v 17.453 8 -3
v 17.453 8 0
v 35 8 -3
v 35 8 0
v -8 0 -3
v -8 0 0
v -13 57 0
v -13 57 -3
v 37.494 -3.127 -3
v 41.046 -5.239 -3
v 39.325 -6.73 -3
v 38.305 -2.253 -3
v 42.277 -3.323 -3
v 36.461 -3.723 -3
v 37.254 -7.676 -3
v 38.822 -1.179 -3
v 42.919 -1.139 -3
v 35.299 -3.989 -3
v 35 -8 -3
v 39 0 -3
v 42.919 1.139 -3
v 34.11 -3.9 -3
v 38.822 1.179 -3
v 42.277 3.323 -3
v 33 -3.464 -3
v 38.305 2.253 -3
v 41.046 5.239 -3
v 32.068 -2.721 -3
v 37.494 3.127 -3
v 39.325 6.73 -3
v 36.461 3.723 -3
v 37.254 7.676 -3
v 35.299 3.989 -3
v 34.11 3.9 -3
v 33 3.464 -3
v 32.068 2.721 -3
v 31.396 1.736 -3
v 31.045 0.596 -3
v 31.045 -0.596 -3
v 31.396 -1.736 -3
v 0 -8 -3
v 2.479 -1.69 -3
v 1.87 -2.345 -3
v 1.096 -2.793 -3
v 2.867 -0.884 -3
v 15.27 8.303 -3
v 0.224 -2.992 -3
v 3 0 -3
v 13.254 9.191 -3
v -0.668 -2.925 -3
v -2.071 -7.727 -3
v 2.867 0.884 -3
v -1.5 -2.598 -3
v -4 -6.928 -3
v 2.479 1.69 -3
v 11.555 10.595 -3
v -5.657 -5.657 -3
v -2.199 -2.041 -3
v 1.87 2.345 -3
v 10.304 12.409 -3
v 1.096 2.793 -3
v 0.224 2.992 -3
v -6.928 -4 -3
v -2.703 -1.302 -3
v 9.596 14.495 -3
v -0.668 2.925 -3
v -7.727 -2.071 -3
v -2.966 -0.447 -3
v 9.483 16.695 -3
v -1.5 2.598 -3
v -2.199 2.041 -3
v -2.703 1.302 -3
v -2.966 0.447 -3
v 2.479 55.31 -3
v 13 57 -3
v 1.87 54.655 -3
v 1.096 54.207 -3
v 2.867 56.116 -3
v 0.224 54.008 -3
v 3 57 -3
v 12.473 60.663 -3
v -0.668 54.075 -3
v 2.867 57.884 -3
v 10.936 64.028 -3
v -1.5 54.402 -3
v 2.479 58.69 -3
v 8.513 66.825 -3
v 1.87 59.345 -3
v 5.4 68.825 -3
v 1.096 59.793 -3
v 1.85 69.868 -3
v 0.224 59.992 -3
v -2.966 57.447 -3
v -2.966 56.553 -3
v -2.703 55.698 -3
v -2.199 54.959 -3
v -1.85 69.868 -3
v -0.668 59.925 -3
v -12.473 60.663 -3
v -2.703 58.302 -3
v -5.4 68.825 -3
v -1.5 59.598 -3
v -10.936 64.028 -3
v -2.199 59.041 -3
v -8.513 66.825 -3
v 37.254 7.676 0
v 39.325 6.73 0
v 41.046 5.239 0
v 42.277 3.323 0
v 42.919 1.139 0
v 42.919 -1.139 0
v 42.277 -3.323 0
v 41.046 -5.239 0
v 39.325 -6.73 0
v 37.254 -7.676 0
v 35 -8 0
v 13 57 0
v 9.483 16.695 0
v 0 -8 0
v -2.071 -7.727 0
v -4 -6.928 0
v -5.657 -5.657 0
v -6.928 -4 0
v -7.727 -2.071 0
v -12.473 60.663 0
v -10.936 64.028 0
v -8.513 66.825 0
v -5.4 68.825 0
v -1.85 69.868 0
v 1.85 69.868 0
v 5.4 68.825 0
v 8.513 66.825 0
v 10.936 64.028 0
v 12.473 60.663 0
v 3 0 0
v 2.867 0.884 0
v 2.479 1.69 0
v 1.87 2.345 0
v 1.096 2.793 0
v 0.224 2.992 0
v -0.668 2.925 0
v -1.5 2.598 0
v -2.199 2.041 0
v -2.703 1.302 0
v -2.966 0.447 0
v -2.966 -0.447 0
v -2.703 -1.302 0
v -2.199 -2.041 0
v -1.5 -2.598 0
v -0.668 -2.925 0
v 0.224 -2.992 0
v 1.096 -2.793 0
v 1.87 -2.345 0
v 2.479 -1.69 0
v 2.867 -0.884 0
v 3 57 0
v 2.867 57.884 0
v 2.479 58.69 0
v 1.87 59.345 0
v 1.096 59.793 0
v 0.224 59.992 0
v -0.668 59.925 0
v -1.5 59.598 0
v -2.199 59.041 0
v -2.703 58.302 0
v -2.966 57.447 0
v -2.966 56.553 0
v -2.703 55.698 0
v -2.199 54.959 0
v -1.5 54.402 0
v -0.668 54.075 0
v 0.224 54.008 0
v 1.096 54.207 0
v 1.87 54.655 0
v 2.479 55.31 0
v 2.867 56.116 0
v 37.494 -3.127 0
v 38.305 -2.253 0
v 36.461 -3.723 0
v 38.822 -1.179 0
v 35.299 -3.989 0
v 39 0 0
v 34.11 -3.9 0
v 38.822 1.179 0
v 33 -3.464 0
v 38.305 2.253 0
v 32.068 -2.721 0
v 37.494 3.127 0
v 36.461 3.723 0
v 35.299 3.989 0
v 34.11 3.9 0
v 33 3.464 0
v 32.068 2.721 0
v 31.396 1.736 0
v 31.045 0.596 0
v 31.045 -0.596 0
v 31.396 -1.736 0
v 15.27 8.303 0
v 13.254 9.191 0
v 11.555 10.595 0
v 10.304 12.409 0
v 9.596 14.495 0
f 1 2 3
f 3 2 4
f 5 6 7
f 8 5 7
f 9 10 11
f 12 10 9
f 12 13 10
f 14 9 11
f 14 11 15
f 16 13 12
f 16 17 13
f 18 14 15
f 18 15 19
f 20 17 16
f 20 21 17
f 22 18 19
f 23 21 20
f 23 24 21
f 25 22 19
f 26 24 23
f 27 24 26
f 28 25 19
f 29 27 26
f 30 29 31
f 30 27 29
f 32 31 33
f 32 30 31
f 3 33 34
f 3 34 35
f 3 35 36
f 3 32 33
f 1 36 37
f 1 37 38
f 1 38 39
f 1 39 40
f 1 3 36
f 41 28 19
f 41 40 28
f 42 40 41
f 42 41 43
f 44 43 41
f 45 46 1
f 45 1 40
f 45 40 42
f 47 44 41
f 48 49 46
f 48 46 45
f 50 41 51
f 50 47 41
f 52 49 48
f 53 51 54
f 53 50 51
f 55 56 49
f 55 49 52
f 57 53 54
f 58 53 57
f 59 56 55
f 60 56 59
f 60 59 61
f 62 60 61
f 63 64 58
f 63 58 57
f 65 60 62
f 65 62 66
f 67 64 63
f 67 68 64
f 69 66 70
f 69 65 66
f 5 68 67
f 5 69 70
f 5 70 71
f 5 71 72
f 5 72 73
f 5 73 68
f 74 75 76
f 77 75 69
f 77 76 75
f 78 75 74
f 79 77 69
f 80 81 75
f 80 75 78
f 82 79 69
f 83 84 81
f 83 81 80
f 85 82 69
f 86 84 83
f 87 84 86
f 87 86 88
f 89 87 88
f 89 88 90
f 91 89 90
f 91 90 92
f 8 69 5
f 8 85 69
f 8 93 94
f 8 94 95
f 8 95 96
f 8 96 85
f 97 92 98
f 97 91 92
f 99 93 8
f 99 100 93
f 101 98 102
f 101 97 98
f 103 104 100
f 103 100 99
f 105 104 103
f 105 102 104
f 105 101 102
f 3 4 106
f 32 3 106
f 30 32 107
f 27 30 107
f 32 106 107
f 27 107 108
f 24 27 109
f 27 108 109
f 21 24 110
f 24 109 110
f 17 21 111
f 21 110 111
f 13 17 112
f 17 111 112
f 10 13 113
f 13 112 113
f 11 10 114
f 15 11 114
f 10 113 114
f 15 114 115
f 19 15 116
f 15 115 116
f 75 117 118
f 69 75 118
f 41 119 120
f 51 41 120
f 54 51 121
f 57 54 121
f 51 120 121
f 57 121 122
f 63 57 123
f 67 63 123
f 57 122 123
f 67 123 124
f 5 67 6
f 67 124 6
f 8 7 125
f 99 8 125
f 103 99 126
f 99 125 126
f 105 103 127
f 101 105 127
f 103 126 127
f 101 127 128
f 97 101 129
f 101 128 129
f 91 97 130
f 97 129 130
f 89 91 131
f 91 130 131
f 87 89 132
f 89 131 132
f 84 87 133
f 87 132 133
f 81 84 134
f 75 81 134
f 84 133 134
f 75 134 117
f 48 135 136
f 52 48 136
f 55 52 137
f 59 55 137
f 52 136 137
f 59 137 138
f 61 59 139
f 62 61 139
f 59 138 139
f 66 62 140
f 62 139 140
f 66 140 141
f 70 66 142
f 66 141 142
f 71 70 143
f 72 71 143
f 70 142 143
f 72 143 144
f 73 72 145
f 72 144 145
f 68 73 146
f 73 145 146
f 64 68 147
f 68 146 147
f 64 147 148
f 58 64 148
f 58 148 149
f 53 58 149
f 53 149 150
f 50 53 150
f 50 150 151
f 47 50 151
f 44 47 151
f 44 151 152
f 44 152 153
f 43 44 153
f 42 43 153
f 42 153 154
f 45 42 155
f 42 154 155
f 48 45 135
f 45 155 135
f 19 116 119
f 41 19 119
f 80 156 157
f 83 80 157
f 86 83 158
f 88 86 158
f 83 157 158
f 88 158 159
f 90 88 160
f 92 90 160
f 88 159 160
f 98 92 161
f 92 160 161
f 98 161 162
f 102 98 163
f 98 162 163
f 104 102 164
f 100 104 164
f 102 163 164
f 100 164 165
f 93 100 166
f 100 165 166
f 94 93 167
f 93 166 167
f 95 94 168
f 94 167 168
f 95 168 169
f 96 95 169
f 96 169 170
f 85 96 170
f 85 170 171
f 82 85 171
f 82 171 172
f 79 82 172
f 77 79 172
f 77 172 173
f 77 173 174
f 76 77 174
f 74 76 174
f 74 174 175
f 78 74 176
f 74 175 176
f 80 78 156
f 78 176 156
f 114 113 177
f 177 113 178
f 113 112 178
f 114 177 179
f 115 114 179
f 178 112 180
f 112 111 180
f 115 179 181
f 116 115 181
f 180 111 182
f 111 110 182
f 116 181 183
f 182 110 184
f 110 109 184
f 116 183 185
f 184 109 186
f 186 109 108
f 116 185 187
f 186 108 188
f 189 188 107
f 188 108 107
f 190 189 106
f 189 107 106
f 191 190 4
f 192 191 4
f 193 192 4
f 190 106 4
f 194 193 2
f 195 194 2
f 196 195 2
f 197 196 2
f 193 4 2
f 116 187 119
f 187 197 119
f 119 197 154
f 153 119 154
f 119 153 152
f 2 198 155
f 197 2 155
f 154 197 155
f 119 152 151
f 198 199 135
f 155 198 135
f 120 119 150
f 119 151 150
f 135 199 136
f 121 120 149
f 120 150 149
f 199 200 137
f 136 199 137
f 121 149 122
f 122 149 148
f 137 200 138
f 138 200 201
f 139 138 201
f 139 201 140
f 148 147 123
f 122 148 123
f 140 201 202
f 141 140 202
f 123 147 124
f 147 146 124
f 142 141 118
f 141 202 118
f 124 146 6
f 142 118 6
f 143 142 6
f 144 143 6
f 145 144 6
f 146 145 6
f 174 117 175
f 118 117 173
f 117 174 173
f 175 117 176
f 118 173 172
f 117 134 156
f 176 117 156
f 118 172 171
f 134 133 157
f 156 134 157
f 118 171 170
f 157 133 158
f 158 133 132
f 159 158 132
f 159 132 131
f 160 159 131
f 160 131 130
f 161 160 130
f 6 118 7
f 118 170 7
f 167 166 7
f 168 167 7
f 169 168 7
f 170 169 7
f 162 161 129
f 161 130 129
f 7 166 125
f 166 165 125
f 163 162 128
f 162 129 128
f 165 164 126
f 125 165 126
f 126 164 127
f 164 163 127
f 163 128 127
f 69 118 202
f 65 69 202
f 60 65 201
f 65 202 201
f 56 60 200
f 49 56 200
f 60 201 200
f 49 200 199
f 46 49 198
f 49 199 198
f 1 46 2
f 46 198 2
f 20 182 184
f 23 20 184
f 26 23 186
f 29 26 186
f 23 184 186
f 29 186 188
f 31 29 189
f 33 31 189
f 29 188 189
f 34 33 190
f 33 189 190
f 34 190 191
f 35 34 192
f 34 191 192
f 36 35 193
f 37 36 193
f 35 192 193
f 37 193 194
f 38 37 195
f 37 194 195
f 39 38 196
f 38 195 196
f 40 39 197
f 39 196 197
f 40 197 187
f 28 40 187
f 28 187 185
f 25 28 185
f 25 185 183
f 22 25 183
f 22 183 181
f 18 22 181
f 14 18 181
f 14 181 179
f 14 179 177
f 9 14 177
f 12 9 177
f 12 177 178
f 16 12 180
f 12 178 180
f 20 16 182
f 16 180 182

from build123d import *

# Parameters (mm, degrees)
SCHIZZO1_R          = 4
SCHIZZO1_R_2        = 3
BASE_FLANGIA3_DEPTH = 3


# Sheet-metal steps are written as plain solids
with BuildPart() as part:
    # Schizzo1 → Base-Flangia3 (new body)
    with BuildSketch(Plane.XY):
        with BuildLine():
            Line((35, -8), (0, -8))
            ThreePointArc((0, -8), (-5.656854249, -5.656854249), (-8, 0))
            Line((-8, 0), (-13, 57))
            ThreePointArc((-13, 57), (0, 70), (13, 57))
            Line((13, 57), (9.483101588, 16.695421866))
            ThreePointArc((9.483101588, 16.695421866), (11.555218404, 10.594603388), (17.452818548, 8))
            Line((17.452818548, 8), (35, 8))
            ThreePointArc((35, 8), (43, 0), (35, -8))
        make_face()
        with Locations((35, 0)):
            Circle(SCHIZZO1_R, mode=Mode.SUBTRACT)
        Circle(SCHIZZO1_R_2, mode=Mode.SUBTRACT)
        with Locations((0, 57)):
            Circle(SCHIZZO1_R_2, mode=Mode.SUBTRACT)
    extrude(amount=-BASE_FLANGIA3_DEPTH)


solid = part.part
